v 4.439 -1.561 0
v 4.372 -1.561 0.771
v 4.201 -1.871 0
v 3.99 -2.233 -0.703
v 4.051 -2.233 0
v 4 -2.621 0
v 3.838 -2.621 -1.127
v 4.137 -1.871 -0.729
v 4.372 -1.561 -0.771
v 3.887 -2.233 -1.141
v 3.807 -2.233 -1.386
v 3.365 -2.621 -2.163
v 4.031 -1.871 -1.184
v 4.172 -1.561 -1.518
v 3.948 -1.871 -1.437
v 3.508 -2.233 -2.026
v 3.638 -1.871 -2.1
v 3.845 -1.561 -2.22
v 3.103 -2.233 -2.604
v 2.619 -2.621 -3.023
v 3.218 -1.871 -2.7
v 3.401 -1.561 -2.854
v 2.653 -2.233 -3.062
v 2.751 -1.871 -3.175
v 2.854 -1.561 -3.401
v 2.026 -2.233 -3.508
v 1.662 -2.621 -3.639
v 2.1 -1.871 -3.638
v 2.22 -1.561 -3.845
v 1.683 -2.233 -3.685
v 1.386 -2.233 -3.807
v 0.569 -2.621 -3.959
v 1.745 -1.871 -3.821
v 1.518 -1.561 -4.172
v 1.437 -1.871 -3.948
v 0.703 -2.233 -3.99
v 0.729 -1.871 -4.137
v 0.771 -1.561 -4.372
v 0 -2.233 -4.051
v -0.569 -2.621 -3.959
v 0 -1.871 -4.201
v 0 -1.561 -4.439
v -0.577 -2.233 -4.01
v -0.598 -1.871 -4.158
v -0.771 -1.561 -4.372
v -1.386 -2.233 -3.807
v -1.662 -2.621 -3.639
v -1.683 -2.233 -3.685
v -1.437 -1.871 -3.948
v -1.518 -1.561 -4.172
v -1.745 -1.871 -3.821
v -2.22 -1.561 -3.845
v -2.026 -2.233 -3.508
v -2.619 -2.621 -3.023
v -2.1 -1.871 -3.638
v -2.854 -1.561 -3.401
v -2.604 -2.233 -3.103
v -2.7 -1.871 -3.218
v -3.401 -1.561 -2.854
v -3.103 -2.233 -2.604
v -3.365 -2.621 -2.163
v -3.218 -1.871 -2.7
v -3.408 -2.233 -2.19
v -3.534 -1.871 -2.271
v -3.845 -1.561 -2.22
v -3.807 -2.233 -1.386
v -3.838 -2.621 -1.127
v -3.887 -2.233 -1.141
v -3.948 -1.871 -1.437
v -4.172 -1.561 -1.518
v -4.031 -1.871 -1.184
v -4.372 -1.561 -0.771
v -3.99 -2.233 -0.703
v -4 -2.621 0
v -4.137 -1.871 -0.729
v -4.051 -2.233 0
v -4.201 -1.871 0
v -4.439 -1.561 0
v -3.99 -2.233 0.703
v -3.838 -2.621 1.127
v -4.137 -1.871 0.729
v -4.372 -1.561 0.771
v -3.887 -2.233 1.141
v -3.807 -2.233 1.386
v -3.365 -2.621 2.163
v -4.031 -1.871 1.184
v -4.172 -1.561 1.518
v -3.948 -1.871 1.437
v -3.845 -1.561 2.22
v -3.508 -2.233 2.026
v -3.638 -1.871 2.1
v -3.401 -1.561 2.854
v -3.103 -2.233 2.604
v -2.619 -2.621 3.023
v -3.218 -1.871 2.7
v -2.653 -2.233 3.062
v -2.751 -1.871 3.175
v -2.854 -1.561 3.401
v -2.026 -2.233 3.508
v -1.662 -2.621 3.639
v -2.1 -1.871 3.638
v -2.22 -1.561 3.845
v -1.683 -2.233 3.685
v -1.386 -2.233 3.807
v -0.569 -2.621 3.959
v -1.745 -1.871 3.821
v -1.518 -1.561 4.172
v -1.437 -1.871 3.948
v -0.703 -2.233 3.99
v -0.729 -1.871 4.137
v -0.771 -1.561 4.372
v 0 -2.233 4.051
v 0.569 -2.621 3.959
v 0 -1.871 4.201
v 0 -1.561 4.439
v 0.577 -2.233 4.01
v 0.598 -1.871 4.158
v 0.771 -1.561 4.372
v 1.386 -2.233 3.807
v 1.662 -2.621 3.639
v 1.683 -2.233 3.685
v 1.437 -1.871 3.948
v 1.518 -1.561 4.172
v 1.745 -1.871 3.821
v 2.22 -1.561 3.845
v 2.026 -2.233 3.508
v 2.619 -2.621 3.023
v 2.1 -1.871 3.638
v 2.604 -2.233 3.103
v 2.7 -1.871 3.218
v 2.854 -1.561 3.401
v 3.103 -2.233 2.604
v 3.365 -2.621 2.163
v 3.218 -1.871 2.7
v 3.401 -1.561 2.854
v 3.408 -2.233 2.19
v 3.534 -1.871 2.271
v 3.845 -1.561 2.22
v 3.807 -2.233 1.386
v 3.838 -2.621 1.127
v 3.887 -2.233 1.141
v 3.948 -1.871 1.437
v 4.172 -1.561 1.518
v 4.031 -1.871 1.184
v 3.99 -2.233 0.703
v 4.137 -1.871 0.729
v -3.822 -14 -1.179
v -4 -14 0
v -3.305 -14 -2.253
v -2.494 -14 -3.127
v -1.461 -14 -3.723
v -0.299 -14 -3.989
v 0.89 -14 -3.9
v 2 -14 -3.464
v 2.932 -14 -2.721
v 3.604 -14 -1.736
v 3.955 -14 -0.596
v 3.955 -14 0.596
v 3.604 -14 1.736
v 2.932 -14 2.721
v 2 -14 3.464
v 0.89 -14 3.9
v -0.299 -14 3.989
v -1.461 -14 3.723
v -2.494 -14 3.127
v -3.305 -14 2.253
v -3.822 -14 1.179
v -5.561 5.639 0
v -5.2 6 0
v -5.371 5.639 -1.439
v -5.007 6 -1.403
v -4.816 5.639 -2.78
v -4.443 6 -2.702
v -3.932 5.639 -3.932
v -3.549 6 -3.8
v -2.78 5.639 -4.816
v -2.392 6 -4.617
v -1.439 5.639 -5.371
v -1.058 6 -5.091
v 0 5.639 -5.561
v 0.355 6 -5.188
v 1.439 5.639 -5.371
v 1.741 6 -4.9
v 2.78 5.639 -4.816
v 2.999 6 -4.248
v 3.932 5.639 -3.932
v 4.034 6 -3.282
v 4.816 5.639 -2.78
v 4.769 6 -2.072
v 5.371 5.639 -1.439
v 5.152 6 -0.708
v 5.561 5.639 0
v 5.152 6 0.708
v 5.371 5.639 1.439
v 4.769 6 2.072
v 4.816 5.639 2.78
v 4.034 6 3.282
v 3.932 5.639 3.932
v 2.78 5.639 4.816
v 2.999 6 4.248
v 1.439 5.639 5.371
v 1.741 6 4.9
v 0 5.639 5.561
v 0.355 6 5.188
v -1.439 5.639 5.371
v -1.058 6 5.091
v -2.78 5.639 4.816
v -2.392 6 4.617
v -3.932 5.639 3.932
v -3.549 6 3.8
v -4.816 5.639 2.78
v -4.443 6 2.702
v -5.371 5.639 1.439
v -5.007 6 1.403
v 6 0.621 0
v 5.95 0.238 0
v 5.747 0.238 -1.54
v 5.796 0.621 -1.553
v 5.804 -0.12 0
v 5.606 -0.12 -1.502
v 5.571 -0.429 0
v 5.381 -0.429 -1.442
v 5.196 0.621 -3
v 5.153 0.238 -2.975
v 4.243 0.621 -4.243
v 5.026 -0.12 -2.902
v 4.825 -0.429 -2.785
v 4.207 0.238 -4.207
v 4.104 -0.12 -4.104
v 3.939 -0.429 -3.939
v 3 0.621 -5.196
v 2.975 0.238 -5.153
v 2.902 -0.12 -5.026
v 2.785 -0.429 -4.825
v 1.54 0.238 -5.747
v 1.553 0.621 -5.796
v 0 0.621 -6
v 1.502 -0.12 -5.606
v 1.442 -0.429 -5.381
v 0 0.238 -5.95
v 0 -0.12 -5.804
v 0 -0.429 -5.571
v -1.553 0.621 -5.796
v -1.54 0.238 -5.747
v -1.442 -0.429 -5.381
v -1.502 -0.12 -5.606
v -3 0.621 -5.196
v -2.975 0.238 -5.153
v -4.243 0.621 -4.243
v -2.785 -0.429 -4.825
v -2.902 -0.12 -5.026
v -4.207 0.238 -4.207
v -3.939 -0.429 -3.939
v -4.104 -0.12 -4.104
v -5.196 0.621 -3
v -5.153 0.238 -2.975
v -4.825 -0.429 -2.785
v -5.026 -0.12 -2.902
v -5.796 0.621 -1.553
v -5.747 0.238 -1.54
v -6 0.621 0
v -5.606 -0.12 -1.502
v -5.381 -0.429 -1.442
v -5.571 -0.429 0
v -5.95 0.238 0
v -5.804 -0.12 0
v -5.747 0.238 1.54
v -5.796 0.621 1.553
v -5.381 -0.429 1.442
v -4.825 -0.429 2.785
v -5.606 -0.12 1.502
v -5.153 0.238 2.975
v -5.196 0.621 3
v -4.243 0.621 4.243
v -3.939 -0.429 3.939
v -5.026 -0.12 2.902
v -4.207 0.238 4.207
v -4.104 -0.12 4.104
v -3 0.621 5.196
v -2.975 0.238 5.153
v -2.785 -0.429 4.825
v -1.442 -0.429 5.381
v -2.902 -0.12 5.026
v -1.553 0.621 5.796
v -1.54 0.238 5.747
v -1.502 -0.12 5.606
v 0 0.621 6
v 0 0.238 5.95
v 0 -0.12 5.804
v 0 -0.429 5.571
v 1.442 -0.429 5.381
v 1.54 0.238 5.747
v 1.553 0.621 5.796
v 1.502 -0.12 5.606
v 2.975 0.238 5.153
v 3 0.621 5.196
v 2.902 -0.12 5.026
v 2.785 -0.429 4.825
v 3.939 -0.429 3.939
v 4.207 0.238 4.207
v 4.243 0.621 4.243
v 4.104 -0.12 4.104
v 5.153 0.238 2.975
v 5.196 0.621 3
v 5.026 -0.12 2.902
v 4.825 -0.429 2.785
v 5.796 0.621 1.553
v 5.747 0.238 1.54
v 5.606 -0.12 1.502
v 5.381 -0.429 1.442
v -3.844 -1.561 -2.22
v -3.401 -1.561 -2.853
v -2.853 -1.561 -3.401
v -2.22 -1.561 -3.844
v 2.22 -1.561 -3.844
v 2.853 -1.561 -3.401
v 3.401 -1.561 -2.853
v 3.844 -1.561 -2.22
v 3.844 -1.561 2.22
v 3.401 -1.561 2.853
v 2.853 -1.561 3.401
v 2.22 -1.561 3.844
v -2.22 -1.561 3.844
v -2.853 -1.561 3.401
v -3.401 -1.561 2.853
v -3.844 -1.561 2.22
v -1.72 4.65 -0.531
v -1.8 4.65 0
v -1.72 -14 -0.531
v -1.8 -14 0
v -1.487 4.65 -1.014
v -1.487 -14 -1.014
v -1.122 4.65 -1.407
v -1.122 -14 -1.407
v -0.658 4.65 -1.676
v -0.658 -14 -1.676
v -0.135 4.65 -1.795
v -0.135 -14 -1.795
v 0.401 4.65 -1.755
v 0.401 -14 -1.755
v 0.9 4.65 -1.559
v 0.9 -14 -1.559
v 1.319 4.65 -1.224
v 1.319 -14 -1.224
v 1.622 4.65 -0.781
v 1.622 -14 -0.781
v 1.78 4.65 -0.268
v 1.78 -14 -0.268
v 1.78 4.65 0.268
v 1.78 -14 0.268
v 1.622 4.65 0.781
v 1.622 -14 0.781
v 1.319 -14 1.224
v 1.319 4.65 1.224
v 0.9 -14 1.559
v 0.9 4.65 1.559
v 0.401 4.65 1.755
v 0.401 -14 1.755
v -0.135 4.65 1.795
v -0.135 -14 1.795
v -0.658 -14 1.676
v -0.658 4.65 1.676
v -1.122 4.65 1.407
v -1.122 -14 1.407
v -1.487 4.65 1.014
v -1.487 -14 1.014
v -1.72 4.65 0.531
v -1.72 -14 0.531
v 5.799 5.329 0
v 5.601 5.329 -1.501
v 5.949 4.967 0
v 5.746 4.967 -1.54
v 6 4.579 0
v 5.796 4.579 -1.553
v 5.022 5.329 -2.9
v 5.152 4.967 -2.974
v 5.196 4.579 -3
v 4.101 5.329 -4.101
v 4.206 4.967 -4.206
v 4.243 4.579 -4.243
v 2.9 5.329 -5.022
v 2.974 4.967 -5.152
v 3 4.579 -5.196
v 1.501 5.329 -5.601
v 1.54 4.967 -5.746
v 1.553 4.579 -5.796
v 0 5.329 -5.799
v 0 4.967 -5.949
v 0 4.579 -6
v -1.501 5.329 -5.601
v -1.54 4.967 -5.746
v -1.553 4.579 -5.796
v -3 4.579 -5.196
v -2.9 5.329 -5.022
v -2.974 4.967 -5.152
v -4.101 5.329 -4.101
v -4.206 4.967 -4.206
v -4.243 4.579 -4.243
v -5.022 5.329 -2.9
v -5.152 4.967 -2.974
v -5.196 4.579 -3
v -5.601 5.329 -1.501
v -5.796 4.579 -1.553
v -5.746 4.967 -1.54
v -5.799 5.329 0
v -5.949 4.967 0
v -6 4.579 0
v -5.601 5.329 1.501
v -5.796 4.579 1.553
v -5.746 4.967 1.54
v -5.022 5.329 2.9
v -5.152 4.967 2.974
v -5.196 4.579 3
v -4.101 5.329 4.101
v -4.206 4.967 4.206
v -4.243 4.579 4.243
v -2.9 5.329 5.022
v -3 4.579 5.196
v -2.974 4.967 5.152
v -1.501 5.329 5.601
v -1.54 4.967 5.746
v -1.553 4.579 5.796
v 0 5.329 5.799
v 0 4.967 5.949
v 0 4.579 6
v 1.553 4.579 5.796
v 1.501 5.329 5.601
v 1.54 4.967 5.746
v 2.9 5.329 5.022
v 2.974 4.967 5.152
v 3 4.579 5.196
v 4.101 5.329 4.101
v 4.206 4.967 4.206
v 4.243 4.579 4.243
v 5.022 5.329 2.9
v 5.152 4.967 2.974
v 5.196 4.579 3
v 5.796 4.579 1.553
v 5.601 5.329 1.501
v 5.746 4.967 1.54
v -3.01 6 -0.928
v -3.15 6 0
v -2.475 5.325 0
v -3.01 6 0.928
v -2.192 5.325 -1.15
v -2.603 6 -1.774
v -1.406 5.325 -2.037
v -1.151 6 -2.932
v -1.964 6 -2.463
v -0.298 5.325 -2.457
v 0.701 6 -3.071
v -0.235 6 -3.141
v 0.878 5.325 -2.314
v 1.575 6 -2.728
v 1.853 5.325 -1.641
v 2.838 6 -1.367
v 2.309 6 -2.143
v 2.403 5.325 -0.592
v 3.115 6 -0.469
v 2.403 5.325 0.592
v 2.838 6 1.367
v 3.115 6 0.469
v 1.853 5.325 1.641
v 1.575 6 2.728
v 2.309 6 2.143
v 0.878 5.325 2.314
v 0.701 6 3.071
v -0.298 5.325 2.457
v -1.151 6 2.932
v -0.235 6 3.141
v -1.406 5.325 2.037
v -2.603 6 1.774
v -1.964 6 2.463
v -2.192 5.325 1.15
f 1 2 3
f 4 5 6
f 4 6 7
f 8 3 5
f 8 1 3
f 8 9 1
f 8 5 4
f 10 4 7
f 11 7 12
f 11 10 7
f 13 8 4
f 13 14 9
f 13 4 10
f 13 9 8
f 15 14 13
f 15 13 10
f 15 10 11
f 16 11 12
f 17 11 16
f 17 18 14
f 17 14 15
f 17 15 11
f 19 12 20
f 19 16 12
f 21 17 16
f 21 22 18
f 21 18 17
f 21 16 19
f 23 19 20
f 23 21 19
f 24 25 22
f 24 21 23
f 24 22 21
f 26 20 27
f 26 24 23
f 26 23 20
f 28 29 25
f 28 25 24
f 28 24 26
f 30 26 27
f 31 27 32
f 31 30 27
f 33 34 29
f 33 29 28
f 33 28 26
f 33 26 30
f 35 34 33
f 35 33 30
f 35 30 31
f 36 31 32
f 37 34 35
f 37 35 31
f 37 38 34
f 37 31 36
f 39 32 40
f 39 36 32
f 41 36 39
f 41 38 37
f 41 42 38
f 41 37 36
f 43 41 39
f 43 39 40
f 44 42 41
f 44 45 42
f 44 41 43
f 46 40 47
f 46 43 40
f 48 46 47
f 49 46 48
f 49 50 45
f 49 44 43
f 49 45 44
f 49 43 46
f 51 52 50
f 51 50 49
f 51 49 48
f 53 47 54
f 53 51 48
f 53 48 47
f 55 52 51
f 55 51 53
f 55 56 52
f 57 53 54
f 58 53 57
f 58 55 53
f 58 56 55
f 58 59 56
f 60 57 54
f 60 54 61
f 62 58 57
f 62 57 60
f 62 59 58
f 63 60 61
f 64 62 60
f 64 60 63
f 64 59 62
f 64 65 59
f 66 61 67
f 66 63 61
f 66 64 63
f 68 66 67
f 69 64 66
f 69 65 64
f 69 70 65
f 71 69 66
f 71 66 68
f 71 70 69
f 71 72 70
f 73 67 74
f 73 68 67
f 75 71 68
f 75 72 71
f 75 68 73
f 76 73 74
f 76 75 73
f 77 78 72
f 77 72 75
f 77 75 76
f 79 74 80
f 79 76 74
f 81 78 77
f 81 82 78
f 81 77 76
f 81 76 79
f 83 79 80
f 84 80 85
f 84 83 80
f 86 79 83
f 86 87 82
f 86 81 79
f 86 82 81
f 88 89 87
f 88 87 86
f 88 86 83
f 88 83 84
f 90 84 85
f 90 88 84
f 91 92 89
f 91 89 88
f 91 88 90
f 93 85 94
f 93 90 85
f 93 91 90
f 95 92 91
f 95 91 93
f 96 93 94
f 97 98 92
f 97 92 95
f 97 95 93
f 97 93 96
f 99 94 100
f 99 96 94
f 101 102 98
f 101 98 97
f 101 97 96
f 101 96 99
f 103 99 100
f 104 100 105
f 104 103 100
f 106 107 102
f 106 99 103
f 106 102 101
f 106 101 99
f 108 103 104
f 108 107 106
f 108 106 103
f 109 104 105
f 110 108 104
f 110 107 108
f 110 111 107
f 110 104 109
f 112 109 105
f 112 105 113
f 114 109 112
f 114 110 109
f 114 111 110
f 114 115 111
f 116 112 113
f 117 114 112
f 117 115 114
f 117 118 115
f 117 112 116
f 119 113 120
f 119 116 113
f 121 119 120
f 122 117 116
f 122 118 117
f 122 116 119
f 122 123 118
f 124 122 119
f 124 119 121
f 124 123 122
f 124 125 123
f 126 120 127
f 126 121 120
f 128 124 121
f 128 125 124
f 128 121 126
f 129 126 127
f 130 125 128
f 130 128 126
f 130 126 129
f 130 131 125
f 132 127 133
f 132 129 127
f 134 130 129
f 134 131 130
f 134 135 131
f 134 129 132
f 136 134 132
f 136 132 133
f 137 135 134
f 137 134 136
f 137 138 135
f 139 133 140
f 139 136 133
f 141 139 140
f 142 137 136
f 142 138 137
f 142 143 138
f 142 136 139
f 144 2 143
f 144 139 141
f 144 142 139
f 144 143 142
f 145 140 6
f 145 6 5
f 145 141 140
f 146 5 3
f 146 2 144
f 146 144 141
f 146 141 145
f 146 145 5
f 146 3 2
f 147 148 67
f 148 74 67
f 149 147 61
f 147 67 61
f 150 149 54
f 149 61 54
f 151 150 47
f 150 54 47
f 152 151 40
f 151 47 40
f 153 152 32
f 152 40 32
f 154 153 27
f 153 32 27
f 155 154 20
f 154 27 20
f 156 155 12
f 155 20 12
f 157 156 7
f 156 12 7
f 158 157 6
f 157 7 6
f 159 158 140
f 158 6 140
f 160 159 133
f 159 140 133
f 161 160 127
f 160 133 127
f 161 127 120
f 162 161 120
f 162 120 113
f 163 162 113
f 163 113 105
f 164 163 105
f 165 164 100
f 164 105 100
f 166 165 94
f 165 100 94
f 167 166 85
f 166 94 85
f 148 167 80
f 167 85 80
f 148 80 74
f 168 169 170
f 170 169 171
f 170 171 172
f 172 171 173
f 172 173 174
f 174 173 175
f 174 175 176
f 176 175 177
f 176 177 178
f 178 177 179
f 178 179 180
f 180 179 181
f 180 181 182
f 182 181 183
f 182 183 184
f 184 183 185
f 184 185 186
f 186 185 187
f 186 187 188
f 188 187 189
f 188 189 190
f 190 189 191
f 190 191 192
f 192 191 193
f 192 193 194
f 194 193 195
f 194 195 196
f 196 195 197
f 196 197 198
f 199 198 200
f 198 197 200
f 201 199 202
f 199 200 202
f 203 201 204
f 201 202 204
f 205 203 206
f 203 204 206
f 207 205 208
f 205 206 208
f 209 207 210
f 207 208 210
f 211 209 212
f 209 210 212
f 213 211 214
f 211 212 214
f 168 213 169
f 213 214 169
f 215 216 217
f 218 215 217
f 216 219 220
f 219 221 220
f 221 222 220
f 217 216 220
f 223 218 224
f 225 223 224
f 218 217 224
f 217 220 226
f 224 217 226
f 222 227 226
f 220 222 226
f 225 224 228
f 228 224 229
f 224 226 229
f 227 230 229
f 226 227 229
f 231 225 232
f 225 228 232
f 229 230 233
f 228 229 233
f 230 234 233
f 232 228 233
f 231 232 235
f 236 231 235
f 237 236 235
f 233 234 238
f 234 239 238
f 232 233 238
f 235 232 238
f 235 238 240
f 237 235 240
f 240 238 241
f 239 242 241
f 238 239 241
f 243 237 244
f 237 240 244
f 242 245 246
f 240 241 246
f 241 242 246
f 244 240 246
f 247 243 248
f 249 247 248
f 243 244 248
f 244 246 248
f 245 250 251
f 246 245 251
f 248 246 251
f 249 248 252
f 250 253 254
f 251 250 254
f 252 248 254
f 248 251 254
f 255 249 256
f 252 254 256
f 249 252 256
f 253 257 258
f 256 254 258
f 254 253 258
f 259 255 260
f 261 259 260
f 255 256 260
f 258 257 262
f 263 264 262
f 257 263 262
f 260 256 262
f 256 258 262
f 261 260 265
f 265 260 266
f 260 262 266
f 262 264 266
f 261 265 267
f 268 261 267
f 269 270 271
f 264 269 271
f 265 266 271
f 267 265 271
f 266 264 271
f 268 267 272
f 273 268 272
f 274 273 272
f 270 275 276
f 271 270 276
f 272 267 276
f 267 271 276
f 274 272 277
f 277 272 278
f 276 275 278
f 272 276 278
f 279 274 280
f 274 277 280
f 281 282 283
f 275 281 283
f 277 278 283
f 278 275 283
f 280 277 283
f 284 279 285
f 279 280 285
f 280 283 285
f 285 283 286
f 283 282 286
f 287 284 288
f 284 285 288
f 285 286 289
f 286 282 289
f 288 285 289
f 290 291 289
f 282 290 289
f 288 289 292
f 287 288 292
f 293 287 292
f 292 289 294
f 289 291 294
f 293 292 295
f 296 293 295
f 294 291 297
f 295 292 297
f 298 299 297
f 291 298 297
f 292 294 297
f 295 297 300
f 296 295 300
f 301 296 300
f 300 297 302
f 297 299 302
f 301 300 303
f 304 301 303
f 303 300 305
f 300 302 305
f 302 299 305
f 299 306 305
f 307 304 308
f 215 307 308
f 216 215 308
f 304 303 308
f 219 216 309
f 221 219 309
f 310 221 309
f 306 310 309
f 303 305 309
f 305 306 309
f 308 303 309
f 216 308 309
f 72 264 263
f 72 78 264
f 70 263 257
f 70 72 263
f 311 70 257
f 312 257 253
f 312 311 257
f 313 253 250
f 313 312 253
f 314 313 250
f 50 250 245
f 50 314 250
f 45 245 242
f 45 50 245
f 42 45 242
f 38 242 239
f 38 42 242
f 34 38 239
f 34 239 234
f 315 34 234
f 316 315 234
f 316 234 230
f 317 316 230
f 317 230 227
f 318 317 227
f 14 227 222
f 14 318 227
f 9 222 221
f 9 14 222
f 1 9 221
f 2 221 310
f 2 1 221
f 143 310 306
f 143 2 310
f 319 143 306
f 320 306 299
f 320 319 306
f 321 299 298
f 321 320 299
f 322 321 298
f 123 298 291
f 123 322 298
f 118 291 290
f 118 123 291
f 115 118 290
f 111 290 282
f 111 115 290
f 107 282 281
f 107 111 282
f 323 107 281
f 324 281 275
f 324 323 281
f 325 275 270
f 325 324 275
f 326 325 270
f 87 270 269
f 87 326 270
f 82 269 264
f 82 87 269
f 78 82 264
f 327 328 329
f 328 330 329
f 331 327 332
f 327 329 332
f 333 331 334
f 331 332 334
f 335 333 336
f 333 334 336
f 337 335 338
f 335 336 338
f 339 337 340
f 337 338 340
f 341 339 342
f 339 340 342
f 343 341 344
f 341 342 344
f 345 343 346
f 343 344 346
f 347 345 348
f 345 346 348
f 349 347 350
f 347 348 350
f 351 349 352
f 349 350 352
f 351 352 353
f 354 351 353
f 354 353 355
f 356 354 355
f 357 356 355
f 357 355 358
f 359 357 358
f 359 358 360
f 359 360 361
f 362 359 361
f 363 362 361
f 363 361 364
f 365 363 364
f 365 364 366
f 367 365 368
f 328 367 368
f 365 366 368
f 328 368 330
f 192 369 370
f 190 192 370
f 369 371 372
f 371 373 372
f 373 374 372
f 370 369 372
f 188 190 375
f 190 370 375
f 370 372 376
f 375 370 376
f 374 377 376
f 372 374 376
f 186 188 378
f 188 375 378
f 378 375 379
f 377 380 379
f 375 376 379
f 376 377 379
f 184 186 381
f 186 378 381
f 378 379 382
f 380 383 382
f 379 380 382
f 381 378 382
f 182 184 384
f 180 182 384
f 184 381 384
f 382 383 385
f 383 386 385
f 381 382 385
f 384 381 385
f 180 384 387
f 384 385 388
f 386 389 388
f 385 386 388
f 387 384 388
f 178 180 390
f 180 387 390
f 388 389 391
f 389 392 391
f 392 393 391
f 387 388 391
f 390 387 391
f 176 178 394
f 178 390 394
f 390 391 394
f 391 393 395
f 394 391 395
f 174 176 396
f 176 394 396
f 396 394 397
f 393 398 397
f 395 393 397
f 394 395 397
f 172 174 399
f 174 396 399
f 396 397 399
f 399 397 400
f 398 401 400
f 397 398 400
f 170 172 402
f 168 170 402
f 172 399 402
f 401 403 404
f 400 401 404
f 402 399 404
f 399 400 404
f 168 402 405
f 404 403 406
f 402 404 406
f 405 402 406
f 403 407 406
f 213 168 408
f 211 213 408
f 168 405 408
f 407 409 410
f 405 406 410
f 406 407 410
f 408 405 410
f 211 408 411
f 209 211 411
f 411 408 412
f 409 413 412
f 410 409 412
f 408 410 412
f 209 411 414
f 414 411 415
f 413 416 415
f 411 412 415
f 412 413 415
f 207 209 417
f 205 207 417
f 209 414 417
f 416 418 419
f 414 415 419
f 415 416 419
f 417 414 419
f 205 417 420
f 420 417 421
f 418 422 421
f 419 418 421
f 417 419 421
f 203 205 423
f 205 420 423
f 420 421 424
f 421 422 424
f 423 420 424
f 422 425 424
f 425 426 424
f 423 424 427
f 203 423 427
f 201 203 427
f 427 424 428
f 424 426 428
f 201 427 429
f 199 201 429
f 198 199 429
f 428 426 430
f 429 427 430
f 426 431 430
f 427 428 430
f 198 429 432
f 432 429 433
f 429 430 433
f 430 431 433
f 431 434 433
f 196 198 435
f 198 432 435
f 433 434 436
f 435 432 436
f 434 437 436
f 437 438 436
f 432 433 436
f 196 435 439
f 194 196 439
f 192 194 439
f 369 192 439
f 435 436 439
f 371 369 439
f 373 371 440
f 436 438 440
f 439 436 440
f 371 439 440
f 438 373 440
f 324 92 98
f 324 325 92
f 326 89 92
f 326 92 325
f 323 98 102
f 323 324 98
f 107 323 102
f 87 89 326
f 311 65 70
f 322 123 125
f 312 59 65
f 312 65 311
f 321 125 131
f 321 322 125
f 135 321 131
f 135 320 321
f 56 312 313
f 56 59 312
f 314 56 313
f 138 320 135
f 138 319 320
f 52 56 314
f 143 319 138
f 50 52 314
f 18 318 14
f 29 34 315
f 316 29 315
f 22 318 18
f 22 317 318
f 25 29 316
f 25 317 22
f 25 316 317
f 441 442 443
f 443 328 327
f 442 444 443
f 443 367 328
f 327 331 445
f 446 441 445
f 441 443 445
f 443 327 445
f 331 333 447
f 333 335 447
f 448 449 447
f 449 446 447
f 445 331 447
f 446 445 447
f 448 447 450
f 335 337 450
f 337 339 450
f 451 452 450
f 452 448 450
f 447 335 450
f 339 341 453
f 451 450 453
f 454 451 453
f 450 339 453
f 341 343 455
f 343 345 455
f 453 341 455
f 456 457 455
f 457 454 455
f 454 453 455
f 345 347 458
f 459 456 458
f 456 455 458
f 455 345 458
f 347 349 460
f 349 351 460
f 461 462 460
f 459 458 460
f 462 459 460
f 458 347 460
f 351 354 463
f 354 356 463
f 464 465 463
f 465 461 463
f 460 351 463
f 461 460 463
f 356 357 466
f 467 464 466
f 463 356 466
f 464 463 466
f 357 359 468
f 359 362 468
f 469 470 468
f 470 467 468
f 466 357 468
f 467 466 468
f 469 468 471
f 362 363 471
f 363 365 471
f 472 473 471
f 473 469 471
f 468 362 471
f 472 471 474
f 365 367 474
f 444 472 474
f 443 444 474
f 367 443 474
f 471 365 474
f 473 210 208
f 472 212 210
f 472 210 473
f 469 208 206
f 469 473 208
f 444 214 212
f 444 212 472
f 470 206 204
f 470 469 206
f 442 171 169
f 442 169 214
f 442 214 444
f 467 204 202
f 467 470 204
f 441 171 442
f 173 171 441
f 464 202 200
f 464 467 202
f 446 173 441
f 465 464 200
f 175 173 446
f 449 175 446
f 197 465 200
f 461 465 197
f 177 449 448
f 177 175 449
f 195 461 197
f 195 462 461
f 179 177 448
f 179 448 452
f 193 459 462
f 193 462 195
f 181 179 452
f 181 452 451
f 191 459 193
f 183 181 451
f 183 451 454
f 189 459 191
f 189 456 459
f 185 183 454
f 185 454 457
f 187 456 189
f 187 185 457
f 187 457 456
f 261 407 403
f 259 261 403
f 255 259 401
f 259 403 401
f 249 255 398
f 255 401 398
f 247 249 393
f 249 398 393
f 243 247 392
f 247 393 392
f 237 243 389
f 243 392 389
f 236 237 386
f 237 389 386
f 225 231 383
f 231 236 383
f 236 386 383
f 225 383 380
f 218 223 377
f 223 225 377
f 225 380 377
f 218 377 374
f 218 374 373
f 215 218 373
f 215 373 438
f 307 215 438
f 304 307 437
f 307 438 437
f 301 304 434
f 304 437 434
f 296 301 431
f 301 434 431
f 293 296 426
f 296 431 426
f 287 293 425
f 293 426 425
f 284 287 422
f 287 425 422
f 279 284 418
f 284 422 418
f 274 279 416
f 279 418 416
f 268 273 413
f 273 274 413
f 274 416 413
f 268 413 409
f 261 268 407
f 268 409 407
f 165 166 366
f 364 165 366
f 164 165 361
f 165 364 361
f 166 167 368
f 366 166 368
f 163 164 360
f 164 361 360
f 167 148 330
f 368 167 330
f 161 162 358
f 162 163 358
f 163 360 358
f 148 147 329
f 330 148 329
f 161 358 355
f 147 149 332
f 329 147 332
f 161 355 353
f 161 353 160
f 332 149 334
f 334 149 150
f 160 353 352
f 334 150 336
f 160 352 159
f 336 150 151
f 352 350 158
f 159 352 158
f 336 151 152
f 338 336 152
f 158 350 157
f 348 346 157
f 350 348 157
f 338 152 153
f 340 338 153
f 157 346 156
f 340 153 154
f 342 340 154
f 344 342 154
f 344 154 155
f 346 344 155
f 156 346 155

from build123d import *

# Parameters (mm, degrees)
SKETCH2_W                                       = 6
SKETCH2_H                                       = 6
SKETCH2_W_2                                     = 4
SKETCH2_H_2                                     = 14
CSK_FOR_M3_FLAT_HEAD_MACHINE_SCREW1_D           = 3.6
CSK_FOR_M3_FLAT_HEAD_MACHINE_SCREW1_CSINK_D     = 6.3
CSK_FOR_M3_FLAT_HEAD_MACHINE_SCREW1_CSINK_ANGLE = 90
CHAMFER1_SIZE                                   = 2
CHAMFER3_SIZE                                   = 0.8


with BuildPart() as part:
    # Sketch2 → Revolve1 (revolve)
    with BuildSketch(Plane.XY, mode=Mode.PRIVATE) as revolve1_sk:
        with Locations((3, 3)):
            Rectangle(SKETCH2_W, SKETCH2_H)
        with Locations((2, -7)):
            Rectangle(SKETCH2_W_2, SKETCH2_H_2)
    revolve(revolve1_sk.sketch.rotate(Axis((0, 0, 0), (0, -1, 0)), 180), axis=Axis((0, 0, 0), (0, -1, 0)))

    # CSK for M3 Flat Head Machine Screw1 (through all)
    with Locations(Plane(origin=(0, 6, 0), x_dir=(1, 0, 0), z_dir=(0, 1, 0))):
        with Locations((0, 0)):
            CounterSinkHole(CSK_FOR_M3_FLAT_HEAD_MACHINE_SCREW1_D / 2, CSK_FOR_M3_FLAT_HEAD_MACHINE_SCREW1_CSINK_D / 2, counter_sink_angle=CSK_FOR_M3_FLAT_HEAD_MACHINE_SCREW1_CSINK_ANGLE)

    # Chamfer1
    chamfer1_edges = [part.edges().sort_by_distance(p)[0] for p in [
        (4, 0, 0),
    ]]
    chamfer(chamfer1_edges, length=CHAMFER1_SIZE - 0.0001)  # a hair under: the kernel refuses the full size

    # Chamfer3
    chamfer3_edges = [part.edges().sort_by_distance(p)[0] for p in [
        (6, 6, 0),
    ]]
    chamfer(chamfer3_edges, length=CHAMFER3_SIZE)

    # Fillet1: read off the stored shape, not the designer's step
    # Fillet1 outline → Fillet1 (revolve, cut)
    with BuildSketch(Plane.XY):
        with BuildLine():
            ThreePointArc((5.560660172, 5.639339828), (5.885819299, 5.152704805), (6, 4.578679656))
            Line((6, 4.578679656), (6, 5.639339828))
            Line((6, 5.639339828), (5.560660172, 5.639339828))
        make_face()
        with BuildLine():
            Line((6, -0.439339828), (6, 0.621320344))
            ThreePointArc((6, 0.621320344), (5.885819299, 0.047295195), (5.560660172, -0.439339828))
            Line((5.560660172, -0.439339828), (6, -0.439339828))
        make_face()
    revolve(axis=Axis((0, 0, 0), (0, 1, 0)), mode=Mode.SUBTRACT)

    # Fillet1 2 outline → Fillet1 2 (revolve)
    with BuildSketch(Plane.XY):
        with BuildLine():
            ThreePointArc((4, -2.621320344), (4.114180701, -2.047295195), (4.439339828, -1.560660172))
            Line((4.439339828, -1.560660172), (4, -1.560660172))
            Line((4, -1.560660172), (4, -2.621320344))
        make_face()
    revolve(axis=Axis((0, 0, 0), (0, 1, 0)))


solid = part.part
